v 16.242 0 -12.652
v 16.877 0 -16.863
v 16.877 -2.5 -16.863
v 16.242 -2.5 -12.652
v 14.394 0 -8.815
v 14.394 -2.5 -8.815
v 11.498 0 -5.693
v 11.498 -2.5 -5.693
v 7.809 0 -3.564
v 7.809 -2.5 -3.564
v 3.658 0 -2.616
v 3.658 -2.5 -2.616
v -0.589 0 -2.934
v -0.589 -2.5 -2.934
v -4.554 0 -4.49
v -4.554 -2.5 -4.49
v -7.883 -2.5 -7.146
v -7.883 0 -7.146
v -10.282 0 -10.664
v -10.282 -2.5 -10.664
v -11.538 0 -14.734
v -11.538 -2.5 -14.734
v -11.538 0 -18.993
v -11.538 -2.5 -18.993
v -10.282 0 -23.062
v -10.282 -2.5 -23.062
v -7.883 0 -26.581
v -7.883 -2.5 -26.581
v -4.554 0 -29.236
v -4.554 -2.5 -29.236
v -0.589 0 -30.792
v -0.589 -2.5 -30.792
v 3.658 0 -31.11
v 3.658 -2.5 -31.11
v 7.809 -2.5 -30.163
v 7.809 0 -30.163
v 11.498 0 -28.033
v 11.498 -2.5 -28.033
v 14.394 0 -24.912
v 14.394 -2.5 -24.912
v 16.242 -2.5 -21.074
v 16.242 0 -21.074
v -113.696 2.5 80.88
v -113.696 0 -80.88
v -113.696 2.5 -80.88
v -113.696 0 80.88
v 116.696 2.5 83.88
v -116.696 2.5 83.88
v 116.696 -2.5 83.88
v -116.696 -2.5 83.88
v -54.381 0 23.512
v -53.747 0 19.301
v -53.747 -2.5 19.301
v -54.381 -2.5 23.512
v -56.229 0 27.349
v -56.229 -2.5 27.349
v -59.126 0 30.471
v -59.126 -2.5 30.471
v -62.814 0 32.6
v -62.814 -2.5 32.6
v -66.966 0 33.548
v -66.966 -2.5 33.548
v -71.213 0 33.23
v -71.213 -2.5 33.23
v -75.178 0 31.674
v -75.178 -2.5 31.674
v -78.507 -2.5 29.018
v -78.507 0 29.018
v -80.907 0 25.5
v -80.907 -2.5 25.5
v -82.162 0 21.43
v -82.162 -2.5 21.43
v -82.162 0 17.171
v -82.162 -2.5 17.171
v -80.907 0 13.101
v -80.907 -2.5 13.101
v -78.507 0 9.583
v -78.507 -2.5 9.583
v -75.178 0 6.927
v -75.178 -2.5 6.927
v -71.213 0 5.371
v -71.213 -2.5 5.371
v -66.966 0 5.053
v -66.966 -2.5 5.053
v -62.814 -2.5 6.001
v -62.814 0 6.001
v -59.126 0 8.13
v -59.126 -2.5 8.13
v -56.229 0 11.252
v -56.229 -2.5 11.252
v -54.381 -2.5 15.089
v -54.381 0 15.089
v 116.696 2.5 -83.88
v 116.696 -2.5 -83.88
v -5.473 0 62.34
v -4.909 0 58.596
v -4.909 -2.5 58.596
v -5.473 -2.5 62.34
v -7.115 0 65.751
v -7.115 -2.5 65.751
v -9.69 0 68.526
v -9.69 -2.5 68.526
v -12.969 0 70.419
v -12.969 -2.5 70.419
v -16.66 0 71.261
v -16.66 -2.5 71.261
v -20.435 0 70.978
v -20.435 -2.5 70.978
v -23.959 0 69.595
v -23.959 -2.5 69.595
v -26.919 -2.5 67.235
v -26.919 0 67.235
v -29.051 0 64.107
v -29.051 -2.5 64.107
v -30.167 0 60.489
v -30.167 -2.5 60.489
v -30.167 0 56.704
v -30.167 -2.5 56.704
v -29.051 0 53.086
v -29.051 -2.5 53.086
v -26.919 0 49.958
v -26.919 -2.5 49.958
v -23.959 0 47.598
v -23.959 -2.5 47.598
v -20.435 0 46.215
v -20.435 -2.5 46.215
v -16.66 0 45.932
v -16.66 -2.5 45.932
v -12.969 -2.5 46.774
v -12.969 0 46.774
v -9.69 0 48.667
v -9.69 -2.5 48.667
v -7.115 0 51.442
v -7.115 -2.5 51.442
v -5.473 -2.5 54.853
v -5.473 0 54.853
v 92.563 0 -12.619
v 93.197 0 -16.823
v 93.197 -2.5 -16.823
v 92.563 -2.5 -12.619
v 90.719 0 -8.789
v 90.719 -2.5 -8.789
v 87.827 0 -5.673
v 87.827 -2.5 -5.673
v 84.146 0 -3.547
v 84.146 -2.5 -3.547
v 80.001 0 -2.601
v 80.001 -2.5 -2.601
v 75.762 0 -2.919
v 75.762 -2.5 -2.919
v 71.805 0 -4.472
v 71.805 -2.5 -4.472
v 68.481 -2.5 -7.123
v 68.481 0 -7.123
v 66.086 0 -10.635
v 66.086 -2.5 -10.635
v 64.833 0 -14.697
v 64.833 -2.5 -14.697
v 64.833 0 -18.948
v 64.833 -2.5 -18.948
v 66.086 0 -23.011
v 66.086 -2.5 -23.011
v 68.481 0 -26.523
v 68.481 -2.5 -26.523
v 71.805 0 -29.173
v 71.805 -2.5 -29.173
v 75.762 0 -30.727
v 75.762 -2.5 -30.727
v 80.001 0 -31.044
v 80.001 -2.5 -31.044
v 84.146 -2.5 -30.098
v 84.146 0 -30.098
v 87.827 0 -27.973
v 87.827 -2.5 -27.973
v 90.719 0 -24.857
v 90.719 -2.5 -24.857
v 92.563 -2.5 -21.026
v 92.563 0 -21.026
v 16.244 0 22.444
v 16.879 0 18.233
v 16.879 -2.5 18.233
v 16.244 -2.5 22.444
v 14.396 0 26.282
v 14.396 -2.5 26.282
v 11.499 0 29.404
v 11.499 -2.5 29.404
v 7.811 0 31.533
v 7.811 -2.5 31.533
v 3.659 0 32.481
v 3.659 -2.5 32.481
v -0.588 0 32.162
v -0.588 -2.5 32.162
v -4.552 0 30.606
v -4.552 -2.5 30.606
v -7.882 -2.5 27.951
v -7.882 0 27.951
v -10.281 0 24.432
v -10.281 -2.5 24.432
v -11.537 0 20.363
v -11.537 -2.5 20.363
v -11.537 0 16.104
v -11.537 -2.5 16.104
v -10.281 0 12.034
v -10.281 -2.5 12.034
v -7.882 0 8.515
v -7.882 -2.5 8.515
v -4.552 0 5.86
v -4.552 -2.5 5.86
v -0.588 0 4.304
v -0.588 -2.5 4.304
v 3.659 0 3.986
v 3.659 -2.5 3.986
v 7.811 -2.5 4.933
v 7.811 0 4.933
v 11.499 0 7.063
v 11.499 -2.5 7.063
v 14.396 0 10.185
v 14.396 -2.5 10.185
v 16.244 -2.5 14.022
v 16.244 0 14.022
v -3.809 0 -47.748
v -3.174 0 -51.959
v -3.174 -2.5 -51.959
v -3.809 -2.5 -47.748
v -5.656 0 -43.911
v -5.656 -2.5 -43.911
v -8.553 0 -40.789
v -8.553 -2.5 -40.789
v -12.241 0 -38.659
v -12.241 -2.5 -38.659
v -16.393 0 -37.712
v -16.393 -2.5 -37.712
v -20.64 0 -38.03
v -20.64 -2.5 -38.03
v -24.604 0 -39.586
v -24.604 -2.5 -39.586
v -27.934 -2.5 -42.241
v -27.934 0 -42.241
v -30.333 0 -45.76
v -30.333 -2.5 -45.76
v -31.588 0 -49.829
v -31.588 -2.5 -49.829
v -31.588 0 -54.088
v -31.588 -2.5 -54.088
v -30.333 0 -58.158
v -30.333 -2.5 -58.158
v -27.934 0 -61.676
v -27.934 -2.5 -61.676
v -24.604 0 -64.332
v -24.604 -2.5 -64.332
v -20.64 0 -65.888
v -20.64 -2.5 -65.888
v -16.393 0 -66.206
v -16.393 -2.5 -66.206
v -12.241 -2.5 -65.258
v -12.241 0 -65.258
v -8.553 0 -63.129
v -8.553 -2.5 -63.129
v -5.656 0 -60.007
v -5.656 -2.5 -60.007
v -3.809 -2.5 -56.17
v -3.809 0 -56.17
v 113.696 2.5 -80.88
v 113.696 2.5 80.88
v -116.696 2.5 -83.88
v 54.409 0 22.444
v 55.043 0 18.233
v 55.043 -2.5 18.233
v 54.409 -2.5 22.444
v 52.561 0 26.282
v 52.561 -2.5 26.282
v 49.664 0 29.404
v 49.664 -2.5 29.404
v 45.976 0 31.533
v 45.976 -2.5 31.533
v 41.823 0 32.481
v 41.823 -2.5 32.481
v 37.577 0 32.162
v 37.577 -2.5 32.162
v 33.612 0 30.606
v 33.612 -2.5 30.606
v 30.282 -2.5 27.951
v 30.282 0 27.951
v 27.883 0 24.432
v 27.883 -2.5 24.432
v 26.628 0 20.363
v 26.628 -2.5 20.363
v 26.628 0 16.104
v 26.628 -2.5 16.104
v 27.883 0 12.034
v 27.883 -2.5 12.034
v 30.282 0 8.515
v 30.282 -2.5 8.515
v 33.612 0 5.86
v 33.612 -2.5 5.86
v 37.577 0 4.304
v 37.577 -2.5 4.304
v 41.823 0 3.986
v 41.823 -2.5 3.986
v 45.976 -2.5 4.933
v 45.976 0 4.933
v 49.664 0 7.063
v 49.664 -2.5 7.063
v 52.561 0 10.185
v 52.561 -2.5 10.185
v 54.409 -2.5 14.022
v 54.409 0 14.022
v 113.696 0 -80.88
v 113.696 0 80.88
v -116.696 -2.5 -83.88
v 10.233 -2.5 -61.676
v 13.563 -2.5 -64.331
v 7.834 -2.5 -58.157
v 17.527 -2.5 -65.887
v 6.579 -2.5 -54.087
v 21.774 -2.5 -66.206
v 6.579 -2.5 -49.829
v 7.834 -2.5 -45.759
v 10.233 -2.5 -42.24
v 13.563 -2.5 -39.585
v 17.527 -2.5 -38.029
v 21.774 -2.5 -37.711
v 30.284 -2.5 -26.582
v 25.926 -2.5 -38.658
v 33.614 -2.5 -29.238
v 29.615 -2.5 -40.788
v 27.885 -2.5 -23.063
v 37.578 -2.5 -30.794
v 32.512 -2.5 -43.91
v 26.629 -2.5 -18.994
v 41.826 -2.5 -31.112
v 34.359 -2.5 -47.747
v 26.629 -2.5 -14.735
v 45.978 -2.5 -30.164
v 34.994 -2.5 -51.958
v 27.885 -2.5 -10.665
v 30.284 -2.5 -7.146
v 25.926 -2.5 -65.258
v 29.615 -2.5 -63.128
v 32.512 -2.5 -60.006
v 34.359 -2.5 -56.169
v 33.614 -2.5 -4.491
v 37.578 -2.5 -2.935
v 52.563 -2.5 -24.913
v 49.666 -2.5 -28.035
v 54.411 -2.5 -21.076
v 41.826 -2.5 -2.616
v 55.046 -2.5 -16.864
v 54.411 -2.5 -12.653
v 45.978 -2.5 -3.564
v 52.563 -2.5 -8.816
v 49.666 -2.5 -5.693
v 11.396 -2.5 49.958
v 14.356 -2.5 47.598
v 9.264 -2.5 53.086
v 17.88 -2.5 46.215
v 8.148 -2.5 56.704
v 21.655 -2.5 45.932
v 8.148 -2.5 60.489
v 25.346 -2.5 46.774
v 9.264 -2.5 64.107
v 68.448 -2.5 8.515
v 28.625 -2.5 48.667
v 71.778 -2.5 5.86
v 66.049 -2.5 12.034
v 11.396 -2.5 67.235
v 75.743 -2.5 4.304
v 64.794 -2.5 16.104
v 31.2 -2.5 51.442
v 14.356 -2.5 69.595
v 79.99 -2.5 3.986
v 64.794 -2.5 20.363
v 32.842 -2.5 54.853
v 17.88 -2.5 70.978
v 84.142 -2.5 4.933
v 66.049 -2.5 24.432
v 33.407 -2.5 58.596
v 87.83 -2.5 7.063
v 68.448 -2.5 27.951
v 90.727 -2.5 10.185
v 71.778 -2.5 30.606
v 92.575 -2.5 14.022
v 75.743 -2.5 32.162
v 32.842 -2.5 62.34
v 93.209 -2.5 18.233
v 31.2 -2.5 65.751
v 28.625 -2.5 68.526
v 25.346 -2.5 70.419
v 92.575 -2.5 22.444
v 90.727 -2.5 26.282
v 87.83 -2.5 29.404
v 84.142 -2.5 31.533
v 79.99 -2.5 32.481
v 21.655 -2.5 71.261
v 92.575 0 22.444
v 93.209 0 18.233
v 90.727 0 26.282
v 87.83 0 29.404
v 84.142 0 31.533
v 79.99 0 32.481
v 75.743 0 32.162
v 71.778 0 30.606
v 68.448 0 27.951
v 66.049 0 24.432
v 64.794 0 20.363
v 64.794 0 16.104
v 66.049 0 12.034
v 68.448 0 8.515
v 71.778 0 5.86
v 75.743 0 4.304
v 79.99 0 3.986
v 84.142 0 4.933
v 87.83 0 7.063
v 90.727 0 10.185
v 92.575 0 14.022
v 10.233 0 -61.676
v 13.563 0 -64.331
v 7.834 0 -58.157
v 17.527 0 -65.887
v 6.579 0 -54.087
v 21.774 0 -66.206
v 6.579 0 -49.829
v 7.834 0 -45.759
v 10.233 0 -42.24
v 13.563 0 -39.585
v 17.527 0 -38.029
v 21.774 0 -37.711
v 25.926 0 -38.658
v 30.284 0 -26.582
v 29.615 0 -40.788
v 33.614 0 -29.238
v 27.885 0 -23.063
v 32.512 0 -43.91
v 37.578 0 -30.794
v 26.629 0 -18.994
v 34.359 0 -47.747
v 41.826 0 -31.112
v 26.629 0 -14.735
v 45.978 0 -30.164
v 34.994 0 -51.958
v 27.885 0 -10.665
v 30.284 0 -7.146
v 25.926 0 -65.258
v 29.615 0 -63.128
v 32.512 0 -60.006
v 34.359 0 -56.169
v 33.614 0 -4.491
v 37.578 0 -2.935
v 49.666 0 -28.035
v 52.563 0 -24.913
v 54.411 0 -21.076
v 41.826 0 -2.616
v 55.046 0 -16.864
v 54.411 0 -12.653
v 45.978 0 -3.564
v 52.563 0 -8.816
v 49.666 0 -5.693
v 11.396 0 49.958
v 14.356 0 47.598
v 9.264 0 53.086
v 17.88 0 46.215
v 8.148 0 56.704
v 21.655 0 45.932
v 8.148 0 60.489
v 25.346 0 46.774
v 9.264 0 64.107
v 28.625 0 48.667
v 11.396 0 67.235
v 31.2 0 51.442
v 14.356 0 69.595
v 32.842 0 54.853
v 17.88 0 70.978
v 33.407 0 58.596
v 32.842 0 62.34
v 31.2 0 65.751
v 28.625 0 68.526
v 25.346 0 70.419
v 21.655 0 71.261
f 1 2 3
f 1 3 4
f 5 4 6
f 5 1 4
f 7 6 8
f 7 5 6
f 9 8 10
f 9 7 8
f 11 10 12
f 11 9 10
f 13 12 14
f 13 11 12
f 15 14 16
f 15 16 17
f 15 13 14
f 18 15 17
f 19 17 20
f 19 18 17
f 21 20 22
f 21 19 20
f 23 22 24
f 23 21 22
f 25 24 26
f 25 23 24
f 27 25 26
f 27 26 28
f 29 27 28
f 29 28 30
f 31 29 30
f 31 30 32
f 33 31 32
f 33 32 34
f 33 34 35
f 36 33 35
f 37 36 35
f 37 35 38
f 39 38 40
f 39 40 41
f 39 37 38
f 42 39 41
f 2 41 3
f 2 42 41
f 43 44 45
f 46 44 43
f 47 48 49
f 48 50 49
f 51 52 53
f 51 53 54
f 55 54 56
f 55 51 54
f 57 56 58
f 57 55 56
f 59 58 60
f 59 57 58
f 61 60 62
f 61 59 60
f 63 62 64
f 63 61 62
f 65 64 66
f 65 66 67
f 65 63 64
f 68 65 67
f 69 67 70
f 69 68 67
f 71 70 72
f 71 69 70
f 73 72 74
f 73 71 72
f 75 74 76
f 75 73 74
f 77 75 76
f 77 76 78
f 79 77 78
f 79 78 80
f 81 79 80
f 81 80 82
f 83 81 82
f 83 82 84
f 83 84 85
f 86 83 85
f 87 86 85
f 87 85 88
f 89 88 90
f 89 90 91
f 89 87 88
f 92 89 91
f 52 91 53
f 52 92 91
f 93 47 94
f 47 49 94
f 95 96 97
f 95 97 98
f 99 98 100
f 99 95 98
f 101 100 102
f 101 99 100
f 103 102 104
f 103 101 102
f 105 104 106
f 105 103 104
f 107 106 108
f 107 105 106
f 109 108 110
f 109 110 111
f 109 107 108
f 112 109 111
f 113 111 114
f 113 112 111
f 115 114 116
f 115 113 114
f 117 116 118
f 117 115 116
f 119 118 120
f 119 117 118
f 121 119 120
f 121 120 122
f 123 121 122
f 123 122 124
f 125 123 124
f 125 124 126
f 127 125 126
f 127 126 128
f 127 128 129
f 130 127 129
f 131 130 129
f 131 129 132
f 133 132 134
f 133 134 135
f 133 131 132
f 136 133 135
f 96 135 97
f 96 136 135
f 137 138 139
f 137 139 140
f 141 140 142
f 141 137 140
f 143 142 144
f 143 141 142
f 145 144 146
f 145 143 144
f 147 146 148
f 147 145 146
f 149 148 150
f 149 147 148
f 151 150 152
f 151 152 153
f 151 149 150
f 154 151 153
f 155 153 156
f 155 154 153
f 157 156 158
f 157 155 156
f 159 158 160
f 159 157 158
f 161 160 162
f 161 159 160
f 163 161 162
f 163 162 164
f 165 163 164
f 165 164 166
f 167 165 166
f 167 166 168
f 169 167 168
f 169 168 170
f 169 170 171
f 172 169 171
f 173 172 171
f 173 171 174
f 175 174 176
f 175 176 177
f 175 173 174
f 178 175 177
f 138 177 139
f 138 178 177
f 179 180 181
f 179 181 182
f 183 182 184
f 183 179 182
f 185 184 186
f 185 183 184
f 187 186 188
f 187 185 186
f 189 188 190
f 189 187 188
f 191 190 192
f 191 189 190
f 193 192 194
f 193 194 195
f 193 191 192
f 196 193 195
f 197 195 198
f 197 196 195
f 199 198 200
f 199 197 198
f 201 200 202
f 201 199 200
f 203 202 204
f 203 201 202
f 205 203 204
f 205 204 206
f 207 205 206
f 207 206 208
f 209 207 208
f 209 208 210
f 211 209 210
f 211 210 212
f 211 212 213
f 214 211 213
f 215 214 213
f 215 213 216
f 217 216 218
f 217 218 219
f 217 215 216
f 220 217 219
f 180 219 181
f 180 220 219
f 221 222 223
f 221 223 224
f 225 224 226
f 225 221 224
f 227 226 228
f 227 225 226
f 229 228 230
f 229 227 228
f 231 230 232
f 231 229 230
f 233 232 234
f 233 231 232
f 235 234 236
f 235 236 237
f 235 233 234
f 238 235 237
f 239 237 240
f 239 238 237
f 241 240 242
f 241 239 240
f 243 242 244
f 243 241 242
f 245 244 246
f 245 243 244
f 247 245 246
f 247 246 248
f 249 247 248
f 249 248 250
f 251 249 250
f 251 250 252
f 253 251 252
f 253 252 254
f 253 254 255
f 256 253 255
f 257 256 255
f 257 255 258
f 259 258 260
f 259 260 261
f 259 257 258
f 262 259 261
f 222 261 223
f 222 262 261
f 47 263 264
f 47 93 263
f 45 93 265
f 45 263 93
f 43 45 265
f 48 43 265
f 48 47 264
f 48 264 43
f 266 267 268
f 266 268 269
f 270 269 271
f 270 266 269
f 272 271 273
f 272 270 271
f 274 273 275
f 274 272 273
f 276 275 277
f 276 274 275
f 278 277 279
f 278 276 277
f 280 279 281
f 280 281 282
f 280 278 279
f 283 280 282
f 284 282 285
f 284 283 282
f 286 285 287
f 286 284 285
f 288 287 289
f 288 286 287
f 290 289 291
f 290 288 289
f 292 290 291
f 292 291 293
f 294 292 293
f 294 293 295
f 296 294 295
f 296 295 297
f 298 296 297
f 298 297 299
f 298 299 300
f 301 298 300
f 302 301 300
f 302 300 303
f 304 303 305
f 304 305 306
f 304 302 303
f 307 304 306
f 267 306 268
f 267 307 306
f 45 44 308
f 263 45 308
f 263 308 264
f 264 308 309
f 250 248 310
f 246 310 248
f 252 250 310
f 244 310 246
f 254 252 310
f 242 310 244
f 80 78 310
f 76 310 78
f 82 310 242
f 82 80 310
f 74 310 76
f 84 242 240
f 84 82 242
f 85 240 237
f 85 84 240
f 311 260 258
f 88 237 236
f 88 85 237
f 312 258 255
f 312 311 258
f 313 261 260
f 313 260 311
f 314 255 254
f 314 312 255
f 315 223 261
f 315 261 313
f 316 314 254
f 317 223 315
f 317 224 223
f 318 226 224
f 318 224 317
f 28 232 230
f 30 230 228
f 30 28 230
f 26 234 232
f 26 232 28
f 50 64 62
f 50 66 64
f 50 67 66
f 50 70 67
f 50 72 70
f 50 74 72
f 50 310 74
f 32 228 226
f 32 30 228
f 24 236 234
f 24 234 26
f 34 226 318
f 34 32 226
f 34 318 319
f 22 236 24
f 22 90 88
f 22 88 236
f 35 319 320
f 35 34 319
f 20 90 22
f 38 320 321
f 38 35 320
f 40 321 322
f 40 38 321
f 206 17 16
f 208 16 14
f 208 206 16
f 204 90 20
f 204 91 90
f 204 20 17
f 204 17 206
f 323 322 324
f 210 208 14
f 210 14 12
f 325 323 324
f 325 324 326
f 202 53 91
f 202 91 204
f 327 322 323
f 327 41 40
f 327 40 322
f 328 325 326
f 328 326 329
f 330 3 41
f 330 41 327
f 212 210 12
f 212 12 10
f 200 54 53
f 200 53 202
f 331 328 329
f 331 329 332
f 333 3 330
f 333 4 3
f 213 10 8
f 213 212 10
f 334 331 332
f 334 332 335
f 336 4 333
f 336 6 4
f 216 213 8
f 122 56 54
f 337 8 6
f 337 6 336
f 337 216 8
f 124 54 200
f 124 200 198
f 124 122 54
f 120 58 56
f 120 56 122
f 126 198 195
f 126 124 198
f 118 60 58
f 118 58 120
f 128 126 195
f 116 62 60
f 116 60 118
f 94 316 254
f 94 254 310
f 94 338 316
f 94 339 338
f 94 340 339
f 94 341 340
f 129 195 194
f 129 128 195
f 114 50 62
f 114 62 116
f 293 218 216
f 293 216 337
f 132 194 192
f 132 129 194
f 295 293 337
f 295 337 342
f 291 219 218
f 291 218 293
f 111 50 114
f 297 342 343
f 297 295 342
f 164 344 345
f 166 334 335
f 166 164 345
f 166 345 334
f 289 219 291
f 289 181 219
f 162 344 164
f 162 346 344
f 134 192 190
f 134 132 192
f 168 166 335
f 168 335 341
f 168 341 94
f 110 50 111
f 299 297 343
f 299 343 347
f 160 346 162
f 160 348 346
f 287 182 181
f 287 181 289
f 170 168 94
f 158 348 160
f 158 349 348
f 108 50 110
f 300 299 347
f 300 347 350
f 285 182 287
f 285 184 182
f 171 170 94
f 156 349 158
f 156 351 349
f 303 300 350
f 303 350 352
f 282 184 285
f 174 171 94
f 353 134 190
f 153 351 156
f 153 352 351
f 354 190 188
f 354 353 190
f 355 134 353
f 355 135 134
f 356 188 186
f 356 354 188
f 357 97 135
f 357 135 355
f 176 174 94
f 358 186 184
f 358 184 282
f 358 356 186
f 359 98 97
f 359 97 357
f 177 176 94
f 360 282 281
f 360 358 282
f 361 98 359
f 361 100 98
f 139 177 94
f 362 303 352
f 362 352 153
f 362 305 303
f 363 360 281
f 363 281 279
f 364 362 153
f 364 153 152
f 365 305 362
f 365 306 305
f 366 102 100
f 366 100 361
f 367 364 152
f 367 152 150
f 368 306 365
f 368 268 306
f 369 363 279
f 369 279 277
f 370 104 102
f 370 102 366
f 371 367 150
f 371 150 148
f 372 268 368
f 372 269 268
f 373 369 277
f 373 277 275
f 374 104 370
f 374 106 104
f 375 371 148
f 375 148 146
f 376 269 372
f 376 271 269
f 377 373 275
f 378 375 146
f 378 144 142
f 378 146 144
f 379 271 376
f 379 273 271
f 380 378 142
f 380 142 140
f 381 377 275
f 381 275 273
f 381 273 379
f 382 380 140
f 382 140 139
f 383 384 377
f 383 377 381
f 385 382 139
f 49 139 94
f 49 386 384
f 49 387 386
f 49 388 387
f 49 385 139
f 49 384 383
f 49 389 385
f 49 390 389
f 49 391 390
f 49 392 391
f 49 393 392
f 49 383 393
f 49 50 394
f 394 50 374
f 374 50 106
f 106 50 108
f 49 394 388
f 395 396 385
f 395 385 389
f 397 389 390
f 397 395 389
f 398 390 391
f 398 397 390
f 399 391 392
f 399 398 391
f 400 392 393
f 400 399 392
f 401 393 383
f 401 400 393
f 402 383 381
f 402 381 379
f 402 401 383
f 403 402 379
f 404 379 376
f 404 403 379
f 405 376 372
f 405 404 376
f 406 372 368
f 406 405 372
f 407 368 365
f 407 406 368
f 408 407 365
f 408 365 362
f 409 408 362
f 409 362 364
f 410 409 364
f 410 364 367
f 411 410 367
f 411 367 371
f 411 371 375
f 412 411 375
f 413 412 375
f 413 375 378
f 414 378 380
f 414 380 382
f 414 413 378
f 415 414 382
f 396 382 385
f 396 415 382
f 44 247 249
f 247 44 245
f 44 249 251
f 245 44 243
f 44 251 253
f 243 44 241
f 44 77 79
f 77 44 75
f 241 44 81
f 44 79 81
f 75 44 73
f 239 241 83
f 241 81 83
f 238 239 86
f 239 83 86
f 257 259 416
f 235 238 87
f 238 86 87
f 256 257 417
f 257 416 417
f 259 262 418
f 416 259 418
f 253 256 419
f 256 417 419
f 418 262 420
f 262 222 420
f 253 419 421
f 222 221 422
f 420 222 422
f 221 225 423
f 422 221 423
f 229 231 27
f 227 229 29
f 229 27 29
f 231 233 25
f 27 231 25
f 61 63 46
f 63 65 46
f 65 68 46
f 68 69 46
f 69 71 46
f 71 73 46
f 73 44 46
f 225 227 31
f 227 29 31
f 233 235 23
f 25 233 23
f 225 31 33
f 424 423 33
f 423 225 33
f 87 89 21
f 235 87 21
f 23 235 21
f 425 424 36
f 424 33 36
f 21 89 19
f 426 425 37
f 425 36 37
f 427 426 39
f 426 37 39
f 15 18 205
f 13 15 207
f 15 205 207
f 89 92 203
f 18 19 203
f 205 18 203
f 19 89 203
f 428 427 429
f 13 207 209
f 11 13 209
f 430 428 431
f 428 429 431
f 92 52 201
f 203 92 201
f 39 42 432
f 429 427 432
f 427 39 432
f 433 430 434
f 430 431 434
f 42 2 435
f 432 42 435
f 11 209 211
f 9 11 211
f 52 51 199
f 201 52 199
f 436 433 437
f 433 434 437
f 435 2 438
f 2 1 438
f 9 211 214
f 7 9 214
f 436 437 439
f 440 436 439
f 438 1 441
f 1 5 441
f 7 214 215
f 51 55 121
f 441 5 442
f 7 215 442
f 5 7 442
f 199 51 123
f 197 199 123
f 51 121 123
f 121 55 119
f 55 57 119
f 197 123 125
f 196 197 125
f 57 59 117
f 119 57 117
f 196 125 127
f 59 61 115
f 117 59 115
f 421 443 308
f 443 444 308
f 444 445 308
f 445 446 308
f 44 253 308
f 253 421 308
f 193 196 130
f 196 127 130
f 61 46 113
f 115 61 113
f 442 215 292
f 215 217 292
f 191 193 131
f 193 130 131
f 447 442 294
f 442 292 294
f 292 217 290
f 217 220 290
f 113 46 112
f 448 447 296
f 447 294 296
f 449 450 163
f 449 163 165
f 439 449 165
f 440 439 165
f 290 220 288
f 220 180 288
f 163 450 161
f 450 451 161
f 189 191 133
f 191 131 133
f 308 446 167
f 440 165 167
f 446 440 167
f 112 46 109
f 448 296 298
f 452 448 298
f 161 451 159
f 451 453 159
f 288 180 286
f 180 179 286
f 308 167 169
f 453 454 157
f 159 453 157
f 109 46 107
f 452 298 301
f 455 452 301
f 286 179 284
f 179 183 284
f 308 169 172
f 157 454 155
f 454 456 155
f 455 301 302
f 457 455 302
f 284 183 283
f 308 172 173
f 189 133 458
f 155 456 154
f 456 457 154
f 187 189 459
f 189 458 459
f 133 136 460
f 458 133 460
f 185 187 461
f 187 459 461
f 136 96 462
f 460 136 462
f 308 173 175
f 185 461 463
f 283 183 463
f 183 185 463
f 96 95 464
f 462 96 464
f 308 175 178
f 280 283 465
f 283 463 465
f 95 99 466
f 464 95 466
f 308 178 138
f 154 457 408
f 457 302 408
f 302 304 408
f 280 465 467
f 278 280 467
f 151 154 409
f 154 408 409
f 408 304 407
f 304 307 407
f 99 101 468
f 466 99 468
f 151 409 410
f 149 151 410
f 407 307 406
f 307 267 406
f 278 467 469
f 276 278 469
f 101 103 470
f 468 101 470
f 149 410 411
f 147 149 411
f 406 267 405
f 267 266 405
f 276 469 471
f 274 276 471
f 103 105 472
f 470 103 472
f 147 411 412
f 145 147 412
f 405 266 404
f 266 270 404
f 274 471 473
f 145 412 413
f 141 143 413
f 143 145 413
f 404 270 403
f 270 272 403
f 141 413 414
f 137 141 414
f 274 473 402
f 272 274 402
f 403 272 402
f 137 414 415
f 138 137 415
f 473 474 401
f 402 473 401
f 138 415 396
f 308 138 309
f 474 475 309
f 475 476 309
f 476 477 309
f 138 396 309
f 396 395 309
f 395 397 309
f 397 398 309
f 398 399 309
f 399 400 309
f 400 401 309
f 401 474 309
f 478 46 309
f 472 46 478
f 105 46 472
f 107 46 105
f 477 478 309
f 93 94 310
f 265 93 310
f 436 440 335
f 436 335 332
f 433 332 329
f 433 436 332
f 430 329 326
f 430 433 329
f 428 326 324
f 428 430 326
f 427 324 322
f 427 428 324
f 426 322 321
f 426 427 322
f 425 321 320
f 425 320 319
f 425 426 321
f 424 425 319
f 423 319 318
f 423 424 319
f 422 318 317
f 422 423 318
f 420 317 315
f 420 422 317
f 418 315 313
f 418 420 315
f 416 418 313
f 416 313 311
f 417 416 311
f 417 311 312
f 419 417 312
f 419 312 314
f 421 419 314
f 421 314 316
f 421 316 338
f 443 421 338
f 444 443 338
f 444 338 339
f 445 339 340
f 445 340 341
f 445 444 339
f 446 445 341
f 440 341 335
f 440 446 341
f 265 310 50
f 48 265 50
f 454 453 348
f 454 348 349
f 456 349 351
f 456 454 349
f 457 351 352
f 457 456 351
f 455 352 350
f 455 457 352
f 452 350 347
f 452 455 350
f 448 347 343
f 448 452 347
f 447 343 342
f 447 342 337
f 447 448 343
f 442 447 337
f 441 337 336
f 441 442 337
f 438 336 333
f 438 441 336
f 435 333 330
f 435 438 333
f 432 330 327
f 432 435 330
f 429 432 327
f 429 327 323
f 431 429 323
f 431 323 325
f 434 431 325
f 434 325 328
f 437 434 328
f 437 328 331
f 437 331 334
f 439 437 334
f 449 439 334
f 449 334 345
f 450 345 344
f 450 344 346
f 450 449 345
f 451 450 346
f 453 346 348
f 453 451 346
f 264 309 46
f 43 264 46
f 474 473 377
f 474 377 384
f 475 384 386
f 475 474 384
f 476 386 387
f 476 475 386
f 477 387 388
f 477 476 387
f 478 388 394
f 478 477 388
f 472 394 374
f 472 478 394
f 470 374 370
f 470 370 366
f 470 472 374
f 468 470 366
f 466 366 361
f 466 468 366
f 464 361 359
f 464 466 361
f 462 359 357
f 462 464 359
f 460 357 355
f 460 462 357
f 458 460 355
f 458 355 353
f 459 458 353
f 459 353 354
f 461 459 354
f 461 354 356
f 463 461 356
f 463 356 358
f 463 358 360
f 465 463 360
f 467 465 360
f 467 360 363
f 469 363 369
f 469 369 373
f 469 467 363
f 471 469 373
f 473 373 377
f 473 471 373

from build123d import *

# Parameters (mm, degrees)
F0_W     = 233.391122
F0_H     = 167.760142
F0_R     = 14.287094
F0_R_2   = 14.2875
F0_R_3   = 14.287856
F0_R_4   = 14.261292
F0_R_5   = 14.287475
F0_R_6   = 12.700237
F1_DEPTH = 2.5
F2_W     = 3
F2_H     = 3
F2_W_2   = 227.391122
F2_H_2   = 161.760142
F3_DEPTH = 2.5


with BuildPart() as f1:
    # F0 (on Front) → F1 (new body)
    with BuildSketch(Plane.XZ):
        Rectangle(F0_W, F0_H)
        with Locations((-17.460909, -51.958768)):
            Circle(F0_R, mode=Mode.SUBTRACT)
        with Locations((20.706644, -51.958057)):
            Circle(F0_R_2, mode=Mode.SUBTRACT)
        with Locations((2.589838, -16.863295)):
            Circle(F0_R, mode=Mode.SUBTRACT)
        with Locations((40.757772, -16.864183)):
            Circle(F0_R_3, mode=Mode.SUBTRACT)
        with Locations((78.93528, -16.822839)):
            Circle(F0_R_4, mode=Mode.SUBTRACT)
        with Locations((-68.03398, 19.30053)):
            Circle(F0_R_5, mode=Mode.SUBTRACT)
        with Locations((-17.608788, 58.596443)):
            Circle(F0_R_6, mode=Mode.SUBTRACT)
        with Locations((2.591311, 18.233144)):
            Circle(F0_R_2, mode=Mode.SUBTRACT)
        with Locations((40.755791, 18.233144)):
            Circle(F0_R_2, mode=Mode.SUBTRACT)
        with Locations((78.921871, 18.233144)):
            Circle(F0_R_2, mode=Mode.SUBTRACT)
        with Locations((20.70639, 58.596469)):
            Circle(F0_R_6, mode=Mode.SUBTRACT)
    extrude(amount=F1_DEPTH)

    # F2 (on face) → F3 (join)
    with BuildSketch(Plane(origin=(0, 0, 0), x_dir=(-1, 0, 0), z_dir=(0, 1, 0))):
        with Locations((-115.195561, -82.380071)):
            Rectangle(F2_W, F2_H)
        with Locations((0, -82.380071)):
            Rectangle(F2_W_2, F2_H)
        with Locations((-115.195561, 0)):
            Rectangle(F2_W, F2_H_2)
        with Locations((115.195561, -82.380071)):
            Rectangle(F2_W, F2_H)
        with Locations((-115.195561, 82.380071)):
            Rectangle(F2_W, F2_H)
        with Locations((115.195561, 0)):
            Rectangle(F2_W, F2_H_2)
        with Locations((0, 82.380071)):
            Rectangle(F2_W_2, F2_H)
        with Locations((115.195561, 82.380071)):
            Rectangle(F2_W, F2_H)
    extrude(amount=F3_DEPTH)


solid = f1.part
